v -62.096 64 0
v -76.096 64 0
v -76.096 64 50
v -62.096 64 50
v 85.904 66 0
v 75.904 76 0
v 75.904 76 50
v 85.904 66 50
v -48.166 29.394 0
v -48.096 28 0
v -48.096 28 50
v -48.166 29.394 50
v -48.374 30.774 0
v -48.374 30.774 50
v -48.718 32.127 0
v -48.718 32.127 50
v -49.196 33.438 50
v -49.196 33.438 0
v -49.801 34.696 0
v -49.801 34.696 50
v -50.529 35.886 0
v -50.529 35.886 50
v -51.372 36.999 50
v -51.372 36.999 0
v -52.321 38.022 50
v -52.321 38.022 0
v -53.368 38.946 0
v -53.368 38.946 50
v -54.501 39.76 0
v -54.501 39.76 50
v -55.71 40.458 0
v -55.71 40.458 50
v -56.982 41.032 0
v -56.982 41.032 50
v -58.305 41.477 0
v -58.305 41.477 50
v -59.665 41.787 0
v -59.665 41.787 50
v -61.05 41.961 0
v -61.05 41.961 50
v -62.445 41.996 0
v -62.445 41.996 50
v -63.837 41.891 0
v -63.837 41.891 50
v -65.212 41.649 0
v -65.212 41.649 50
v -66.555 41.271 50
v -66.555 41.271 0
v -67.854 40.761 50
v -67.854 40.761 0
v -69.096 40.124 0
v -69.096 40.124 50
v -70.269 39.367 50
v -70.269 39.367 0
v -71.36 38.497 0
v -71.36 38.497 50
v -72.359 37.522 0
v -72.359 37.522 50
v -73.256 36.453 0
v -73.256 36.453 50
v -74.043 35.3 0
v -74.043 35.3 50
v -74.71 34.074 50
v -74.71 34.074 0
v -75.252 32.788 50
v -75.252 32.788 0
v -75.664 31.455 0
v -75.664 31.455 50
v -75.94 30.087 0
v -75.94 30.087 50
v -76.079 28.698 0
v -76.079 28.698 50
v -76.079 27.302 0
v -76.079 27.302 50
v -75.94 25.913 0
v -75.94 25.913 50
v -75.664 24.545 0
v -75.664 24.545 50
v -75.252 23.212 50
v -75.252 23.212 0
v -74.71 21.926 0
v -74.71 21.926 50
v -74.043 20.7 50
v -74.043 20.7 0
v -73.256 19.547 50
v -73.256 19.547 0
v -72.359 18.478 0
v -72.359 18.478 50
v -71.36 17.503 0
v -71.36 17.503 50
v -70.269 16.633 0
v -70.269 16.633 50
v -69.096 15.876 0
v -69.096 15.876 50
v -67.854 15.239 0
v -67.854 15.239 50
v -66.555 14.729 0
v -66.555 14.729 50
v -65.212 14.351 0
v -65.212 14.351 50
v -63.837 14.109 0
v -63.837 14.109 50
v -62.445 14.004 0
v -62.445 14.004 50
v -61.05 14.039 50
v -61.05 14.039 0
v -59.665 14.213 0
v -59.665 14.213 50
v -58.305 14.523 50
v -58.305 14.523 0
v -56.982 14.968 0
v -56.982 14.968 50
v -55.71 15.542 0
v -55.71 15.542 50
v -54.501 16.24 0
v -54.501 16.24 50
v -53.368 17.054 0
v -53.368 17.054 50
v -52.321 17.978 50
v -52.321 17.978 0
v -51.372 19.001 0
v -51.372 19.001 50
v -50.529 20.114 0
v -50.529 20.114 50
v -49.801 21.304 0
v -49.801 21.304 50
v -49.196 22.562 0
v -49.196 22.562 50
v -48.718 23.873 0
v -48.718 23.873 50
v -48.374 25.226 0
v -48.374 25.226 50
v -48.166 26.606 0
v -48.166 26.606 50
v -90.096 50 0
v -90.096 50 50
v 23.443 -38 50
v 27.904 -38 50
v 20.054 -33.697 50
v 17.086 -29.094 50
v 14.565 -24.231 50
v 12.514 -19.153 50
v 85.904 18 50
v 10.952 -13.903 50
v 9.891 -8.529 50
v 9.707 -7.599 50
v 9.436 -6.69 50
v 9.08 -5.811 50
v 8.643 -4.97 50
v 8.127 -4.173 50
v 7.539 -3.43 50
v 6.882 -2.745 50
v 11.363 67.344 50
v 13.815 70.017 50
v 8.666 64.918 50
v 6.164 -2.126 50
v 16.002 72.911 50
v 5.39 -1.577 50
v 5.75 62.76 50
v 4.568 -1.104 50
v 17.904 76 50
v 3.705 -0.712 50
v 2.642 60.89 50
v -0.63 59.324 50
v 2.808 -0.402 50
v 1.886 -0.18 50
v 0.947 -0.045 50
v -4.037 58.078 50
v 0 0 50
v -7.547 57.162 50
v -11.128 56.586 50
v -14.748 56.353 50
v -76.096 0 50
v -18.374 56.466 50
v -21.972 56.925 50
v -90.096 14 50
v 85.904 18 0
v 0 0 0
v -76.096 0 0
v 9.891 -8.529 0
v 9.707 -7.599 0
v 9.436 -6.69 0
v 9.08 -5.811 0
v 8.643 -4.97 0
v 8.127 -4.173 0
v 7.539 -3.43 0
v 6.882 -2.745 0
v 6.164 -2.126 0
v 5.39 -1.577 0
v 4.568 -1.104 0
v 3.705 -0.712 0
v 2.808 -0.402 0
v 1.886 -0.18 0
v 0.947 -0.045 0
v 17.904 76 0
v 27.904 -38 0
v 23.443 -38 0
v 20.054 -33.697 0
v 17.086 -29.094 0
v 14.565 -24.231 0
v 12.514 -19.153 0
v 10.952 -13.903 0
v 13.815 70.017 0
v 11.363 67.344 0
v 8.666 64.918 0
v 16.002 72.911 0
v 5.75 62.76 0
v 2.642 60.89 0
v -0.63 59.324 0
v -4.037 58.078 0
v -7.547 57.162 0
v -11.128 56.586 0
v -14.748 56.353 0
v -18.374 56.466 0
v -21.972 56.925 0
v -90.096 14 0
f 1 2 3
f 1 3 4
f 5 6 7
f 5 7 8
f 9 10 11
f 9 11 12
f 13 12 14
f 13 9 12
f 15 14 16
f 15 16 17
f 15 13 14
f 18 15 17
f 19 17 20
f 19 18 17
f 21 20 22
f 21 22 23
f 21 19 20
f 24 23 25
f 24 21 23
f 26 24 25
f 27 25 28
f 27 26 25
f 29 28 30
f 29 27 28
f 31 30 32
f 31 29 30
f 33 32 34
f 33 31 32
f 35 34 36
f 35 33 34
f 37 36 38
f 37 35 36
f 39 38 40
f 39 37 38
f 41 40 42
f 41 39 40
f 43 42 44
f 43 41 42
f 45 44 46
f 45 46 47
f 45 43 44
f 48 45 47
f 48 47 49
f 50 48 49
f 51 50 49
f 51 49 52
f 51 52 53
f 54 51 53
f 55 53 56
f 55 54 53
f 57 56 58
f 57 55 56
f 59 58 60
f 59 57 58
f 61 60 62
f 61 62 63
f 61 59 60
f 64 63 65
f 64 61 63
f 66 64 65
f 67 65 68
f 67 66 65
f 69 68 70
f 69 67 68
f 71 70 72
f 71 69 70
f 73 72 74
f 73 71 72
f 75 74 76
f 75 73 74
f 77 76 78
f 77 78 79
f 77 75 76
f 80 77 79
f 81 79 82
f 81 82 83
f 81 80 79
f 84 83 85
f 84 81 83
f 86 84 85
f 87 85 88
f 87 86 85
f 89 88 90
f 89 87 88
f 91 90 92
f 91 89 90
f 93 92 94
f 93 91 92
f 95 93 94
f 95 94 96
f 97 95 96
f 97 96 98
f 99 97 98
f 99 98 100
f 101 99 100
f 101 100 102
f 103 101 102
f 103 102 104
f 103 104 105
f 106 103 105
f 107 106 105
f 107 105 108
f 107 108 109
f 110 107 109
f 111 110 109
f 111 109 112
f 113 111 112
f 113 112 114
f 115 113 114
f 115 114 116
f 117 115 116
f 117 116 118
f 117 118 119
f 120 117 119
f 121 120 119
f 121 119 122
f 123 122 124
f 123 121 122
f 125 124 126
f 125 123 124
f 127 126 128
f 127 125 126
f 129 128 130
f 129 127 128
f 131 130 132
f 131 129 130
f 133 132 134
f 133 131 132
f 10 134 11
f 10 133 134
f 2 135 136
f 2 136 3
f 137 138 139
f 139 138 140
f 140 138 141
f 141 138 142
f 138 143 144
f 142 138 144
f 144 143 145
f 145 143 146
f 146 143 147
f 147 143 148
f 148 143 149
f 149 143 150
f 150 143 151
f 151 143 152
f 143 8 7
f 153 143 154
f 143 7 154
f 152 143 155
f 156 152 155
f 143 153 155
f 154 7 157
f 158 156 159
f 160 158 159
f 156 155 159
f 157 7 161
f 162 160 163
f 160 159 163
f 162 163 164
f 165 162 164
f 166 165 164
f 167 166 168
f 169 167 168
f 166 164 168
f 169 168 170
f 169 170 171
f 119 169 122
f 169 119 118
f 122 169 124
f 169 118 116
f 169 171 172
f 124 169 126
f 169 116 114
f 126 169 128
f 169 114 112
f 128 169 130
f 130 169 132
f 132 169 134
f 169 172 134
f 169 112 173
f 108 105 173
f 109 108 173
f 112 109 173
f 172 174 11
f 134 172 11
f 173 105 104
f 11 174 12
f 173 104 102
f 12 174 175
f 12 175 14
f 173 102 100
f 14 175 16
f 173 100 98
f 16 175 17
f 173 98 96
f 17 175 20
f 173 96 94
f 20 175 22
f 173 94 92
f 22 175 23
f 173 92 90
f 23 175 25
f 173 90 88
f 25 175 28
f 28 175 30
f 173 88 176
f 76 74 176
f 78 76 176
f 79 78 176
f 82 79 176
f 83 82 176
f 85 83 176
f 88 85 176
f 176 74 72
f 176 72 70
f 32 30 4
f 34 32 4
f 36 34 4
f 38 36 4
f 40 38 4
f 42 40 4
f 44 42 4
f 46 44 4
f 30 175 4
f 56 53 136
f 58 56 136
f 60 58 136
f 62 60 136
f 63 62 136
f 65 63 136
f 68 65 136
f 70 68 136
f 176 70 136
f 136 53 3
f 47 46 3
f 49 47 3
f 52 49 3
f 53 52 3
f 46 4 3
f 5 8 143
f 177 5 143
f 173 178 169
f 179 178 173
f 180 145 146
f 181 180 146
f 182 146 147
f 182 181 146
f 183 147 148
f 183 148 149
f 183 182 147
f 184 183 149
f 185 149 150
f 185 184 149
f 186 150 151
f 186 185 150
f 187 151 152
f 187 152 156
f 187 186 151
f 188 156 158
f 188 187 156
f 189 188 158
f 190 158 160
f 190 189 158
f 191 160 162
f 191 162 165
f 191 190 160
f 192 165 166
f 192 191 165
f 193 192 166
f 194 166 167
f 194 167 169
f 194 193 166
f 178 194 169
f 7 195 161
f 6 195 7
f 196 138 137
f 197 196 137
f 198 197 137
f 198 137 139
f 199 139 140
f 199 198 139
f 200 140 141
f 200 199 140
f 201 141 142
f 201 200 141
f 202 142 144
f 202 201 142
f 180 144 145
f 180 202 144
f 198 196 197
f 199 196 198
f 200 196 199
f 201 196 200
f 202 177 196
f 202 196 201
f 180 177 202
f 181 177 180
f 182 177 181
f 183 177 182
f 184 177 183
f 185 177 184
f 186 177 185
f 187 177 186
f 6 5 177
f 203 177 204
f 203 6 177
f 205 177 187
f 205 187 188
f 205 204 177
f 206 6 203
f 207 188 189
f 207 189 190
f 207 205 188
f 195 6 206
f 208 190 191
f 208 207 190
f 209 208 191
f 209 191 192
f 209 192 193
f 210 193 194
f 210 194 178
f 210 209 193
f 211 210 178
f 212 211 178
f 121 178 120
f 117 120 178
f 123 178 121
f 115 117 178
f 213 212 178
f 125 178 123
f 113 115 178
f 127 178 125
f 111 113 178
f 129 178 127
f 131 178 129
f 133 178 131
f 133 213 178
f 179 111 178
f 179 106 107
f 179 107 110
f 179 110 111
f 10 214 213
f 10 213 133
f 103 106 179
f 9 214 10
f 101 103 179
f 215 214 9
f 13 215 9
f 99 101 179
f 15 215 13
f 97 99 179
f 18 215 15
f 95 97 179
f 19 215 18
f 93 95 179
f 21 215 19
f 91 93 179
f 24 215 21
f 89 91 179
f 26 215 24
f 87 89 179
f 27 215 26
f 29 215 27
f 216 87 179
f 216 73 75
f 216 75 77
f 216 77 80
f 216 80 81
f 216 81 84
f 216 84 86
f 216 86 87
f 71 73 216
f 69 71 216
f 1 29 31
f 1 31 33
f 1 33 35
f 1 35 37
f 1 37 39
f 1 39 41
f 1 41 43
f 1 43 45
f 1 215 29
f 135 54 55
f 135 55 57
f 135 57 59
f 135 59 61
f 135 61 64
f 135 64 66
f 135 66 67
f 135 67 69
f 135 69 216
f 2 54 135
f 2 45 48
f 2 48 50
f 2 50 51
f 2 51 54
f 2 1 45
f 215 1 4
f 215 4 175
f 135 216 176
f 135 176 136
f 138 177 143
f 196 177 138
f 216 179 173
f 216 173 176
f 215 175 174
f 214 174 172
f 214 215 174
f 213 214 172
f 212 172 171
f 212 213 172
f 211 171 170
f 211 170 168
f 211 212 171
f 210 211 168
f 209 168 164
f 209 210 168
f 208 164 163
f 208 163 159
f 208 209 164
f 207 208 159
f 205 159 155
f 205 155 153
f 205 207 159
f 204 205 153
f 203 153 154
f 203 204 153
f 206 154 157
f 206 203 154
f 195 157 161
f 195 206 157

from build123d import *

# Parameters (mm, degrees)
SKETCH1_R           = 14
BOSS_EXTRUDE1_DEPTH = 50


with BuildPart() as part:
    # Sketch1 → Boss-Extrude1 (new body)
    with BuildSketch(Plane.XY):
        with BuildLine():
            Line((0, 0), (-76.096455974, 0))
            Line((-76.096455974, 0), (-90.096455974, 14))
            Line((-90.096455974, 14), (-90.096455974, 50))
            Line((-90.096455974, 50), (-76.096455974, 64))
            Line((-76.096455974, 64), (-62.096455974, 64))
            Line((-62.096455974, 64), (-21.972137383, 56.92500005))
            ThreePointArc((-21.972137383, 56.92500005), (1.024616064, 60.067940114), (17.903544026, 76))
            Line((17.903544026, 76), (75.903544026, 76))
            Line((75.903544026, 76), (85.903544026, 66))
            Line((85.903544026, 66), (85.903544026, 18))
            Line((85.903544026, 18), (27.903544026, -38))
            Line((27.903544026, -38), (23.442882283, -38))
            ThreePointArc((23.442882283, -38), (14.564937889, -24.231344122), (9.891277483, -8.529411765))
            ThreePointArc((9.891277483, -8.529411765), (6.530471562, -2.426827536), (0, 0))
        make_face()
        with Locations((-62.096455974, 28)):
            Circle(SKETCH1_R, mode=Mode.SUBTRACT)
    extrude(amount=BOSS_EXTRUDE1_DEPTH)


solid = part.part
